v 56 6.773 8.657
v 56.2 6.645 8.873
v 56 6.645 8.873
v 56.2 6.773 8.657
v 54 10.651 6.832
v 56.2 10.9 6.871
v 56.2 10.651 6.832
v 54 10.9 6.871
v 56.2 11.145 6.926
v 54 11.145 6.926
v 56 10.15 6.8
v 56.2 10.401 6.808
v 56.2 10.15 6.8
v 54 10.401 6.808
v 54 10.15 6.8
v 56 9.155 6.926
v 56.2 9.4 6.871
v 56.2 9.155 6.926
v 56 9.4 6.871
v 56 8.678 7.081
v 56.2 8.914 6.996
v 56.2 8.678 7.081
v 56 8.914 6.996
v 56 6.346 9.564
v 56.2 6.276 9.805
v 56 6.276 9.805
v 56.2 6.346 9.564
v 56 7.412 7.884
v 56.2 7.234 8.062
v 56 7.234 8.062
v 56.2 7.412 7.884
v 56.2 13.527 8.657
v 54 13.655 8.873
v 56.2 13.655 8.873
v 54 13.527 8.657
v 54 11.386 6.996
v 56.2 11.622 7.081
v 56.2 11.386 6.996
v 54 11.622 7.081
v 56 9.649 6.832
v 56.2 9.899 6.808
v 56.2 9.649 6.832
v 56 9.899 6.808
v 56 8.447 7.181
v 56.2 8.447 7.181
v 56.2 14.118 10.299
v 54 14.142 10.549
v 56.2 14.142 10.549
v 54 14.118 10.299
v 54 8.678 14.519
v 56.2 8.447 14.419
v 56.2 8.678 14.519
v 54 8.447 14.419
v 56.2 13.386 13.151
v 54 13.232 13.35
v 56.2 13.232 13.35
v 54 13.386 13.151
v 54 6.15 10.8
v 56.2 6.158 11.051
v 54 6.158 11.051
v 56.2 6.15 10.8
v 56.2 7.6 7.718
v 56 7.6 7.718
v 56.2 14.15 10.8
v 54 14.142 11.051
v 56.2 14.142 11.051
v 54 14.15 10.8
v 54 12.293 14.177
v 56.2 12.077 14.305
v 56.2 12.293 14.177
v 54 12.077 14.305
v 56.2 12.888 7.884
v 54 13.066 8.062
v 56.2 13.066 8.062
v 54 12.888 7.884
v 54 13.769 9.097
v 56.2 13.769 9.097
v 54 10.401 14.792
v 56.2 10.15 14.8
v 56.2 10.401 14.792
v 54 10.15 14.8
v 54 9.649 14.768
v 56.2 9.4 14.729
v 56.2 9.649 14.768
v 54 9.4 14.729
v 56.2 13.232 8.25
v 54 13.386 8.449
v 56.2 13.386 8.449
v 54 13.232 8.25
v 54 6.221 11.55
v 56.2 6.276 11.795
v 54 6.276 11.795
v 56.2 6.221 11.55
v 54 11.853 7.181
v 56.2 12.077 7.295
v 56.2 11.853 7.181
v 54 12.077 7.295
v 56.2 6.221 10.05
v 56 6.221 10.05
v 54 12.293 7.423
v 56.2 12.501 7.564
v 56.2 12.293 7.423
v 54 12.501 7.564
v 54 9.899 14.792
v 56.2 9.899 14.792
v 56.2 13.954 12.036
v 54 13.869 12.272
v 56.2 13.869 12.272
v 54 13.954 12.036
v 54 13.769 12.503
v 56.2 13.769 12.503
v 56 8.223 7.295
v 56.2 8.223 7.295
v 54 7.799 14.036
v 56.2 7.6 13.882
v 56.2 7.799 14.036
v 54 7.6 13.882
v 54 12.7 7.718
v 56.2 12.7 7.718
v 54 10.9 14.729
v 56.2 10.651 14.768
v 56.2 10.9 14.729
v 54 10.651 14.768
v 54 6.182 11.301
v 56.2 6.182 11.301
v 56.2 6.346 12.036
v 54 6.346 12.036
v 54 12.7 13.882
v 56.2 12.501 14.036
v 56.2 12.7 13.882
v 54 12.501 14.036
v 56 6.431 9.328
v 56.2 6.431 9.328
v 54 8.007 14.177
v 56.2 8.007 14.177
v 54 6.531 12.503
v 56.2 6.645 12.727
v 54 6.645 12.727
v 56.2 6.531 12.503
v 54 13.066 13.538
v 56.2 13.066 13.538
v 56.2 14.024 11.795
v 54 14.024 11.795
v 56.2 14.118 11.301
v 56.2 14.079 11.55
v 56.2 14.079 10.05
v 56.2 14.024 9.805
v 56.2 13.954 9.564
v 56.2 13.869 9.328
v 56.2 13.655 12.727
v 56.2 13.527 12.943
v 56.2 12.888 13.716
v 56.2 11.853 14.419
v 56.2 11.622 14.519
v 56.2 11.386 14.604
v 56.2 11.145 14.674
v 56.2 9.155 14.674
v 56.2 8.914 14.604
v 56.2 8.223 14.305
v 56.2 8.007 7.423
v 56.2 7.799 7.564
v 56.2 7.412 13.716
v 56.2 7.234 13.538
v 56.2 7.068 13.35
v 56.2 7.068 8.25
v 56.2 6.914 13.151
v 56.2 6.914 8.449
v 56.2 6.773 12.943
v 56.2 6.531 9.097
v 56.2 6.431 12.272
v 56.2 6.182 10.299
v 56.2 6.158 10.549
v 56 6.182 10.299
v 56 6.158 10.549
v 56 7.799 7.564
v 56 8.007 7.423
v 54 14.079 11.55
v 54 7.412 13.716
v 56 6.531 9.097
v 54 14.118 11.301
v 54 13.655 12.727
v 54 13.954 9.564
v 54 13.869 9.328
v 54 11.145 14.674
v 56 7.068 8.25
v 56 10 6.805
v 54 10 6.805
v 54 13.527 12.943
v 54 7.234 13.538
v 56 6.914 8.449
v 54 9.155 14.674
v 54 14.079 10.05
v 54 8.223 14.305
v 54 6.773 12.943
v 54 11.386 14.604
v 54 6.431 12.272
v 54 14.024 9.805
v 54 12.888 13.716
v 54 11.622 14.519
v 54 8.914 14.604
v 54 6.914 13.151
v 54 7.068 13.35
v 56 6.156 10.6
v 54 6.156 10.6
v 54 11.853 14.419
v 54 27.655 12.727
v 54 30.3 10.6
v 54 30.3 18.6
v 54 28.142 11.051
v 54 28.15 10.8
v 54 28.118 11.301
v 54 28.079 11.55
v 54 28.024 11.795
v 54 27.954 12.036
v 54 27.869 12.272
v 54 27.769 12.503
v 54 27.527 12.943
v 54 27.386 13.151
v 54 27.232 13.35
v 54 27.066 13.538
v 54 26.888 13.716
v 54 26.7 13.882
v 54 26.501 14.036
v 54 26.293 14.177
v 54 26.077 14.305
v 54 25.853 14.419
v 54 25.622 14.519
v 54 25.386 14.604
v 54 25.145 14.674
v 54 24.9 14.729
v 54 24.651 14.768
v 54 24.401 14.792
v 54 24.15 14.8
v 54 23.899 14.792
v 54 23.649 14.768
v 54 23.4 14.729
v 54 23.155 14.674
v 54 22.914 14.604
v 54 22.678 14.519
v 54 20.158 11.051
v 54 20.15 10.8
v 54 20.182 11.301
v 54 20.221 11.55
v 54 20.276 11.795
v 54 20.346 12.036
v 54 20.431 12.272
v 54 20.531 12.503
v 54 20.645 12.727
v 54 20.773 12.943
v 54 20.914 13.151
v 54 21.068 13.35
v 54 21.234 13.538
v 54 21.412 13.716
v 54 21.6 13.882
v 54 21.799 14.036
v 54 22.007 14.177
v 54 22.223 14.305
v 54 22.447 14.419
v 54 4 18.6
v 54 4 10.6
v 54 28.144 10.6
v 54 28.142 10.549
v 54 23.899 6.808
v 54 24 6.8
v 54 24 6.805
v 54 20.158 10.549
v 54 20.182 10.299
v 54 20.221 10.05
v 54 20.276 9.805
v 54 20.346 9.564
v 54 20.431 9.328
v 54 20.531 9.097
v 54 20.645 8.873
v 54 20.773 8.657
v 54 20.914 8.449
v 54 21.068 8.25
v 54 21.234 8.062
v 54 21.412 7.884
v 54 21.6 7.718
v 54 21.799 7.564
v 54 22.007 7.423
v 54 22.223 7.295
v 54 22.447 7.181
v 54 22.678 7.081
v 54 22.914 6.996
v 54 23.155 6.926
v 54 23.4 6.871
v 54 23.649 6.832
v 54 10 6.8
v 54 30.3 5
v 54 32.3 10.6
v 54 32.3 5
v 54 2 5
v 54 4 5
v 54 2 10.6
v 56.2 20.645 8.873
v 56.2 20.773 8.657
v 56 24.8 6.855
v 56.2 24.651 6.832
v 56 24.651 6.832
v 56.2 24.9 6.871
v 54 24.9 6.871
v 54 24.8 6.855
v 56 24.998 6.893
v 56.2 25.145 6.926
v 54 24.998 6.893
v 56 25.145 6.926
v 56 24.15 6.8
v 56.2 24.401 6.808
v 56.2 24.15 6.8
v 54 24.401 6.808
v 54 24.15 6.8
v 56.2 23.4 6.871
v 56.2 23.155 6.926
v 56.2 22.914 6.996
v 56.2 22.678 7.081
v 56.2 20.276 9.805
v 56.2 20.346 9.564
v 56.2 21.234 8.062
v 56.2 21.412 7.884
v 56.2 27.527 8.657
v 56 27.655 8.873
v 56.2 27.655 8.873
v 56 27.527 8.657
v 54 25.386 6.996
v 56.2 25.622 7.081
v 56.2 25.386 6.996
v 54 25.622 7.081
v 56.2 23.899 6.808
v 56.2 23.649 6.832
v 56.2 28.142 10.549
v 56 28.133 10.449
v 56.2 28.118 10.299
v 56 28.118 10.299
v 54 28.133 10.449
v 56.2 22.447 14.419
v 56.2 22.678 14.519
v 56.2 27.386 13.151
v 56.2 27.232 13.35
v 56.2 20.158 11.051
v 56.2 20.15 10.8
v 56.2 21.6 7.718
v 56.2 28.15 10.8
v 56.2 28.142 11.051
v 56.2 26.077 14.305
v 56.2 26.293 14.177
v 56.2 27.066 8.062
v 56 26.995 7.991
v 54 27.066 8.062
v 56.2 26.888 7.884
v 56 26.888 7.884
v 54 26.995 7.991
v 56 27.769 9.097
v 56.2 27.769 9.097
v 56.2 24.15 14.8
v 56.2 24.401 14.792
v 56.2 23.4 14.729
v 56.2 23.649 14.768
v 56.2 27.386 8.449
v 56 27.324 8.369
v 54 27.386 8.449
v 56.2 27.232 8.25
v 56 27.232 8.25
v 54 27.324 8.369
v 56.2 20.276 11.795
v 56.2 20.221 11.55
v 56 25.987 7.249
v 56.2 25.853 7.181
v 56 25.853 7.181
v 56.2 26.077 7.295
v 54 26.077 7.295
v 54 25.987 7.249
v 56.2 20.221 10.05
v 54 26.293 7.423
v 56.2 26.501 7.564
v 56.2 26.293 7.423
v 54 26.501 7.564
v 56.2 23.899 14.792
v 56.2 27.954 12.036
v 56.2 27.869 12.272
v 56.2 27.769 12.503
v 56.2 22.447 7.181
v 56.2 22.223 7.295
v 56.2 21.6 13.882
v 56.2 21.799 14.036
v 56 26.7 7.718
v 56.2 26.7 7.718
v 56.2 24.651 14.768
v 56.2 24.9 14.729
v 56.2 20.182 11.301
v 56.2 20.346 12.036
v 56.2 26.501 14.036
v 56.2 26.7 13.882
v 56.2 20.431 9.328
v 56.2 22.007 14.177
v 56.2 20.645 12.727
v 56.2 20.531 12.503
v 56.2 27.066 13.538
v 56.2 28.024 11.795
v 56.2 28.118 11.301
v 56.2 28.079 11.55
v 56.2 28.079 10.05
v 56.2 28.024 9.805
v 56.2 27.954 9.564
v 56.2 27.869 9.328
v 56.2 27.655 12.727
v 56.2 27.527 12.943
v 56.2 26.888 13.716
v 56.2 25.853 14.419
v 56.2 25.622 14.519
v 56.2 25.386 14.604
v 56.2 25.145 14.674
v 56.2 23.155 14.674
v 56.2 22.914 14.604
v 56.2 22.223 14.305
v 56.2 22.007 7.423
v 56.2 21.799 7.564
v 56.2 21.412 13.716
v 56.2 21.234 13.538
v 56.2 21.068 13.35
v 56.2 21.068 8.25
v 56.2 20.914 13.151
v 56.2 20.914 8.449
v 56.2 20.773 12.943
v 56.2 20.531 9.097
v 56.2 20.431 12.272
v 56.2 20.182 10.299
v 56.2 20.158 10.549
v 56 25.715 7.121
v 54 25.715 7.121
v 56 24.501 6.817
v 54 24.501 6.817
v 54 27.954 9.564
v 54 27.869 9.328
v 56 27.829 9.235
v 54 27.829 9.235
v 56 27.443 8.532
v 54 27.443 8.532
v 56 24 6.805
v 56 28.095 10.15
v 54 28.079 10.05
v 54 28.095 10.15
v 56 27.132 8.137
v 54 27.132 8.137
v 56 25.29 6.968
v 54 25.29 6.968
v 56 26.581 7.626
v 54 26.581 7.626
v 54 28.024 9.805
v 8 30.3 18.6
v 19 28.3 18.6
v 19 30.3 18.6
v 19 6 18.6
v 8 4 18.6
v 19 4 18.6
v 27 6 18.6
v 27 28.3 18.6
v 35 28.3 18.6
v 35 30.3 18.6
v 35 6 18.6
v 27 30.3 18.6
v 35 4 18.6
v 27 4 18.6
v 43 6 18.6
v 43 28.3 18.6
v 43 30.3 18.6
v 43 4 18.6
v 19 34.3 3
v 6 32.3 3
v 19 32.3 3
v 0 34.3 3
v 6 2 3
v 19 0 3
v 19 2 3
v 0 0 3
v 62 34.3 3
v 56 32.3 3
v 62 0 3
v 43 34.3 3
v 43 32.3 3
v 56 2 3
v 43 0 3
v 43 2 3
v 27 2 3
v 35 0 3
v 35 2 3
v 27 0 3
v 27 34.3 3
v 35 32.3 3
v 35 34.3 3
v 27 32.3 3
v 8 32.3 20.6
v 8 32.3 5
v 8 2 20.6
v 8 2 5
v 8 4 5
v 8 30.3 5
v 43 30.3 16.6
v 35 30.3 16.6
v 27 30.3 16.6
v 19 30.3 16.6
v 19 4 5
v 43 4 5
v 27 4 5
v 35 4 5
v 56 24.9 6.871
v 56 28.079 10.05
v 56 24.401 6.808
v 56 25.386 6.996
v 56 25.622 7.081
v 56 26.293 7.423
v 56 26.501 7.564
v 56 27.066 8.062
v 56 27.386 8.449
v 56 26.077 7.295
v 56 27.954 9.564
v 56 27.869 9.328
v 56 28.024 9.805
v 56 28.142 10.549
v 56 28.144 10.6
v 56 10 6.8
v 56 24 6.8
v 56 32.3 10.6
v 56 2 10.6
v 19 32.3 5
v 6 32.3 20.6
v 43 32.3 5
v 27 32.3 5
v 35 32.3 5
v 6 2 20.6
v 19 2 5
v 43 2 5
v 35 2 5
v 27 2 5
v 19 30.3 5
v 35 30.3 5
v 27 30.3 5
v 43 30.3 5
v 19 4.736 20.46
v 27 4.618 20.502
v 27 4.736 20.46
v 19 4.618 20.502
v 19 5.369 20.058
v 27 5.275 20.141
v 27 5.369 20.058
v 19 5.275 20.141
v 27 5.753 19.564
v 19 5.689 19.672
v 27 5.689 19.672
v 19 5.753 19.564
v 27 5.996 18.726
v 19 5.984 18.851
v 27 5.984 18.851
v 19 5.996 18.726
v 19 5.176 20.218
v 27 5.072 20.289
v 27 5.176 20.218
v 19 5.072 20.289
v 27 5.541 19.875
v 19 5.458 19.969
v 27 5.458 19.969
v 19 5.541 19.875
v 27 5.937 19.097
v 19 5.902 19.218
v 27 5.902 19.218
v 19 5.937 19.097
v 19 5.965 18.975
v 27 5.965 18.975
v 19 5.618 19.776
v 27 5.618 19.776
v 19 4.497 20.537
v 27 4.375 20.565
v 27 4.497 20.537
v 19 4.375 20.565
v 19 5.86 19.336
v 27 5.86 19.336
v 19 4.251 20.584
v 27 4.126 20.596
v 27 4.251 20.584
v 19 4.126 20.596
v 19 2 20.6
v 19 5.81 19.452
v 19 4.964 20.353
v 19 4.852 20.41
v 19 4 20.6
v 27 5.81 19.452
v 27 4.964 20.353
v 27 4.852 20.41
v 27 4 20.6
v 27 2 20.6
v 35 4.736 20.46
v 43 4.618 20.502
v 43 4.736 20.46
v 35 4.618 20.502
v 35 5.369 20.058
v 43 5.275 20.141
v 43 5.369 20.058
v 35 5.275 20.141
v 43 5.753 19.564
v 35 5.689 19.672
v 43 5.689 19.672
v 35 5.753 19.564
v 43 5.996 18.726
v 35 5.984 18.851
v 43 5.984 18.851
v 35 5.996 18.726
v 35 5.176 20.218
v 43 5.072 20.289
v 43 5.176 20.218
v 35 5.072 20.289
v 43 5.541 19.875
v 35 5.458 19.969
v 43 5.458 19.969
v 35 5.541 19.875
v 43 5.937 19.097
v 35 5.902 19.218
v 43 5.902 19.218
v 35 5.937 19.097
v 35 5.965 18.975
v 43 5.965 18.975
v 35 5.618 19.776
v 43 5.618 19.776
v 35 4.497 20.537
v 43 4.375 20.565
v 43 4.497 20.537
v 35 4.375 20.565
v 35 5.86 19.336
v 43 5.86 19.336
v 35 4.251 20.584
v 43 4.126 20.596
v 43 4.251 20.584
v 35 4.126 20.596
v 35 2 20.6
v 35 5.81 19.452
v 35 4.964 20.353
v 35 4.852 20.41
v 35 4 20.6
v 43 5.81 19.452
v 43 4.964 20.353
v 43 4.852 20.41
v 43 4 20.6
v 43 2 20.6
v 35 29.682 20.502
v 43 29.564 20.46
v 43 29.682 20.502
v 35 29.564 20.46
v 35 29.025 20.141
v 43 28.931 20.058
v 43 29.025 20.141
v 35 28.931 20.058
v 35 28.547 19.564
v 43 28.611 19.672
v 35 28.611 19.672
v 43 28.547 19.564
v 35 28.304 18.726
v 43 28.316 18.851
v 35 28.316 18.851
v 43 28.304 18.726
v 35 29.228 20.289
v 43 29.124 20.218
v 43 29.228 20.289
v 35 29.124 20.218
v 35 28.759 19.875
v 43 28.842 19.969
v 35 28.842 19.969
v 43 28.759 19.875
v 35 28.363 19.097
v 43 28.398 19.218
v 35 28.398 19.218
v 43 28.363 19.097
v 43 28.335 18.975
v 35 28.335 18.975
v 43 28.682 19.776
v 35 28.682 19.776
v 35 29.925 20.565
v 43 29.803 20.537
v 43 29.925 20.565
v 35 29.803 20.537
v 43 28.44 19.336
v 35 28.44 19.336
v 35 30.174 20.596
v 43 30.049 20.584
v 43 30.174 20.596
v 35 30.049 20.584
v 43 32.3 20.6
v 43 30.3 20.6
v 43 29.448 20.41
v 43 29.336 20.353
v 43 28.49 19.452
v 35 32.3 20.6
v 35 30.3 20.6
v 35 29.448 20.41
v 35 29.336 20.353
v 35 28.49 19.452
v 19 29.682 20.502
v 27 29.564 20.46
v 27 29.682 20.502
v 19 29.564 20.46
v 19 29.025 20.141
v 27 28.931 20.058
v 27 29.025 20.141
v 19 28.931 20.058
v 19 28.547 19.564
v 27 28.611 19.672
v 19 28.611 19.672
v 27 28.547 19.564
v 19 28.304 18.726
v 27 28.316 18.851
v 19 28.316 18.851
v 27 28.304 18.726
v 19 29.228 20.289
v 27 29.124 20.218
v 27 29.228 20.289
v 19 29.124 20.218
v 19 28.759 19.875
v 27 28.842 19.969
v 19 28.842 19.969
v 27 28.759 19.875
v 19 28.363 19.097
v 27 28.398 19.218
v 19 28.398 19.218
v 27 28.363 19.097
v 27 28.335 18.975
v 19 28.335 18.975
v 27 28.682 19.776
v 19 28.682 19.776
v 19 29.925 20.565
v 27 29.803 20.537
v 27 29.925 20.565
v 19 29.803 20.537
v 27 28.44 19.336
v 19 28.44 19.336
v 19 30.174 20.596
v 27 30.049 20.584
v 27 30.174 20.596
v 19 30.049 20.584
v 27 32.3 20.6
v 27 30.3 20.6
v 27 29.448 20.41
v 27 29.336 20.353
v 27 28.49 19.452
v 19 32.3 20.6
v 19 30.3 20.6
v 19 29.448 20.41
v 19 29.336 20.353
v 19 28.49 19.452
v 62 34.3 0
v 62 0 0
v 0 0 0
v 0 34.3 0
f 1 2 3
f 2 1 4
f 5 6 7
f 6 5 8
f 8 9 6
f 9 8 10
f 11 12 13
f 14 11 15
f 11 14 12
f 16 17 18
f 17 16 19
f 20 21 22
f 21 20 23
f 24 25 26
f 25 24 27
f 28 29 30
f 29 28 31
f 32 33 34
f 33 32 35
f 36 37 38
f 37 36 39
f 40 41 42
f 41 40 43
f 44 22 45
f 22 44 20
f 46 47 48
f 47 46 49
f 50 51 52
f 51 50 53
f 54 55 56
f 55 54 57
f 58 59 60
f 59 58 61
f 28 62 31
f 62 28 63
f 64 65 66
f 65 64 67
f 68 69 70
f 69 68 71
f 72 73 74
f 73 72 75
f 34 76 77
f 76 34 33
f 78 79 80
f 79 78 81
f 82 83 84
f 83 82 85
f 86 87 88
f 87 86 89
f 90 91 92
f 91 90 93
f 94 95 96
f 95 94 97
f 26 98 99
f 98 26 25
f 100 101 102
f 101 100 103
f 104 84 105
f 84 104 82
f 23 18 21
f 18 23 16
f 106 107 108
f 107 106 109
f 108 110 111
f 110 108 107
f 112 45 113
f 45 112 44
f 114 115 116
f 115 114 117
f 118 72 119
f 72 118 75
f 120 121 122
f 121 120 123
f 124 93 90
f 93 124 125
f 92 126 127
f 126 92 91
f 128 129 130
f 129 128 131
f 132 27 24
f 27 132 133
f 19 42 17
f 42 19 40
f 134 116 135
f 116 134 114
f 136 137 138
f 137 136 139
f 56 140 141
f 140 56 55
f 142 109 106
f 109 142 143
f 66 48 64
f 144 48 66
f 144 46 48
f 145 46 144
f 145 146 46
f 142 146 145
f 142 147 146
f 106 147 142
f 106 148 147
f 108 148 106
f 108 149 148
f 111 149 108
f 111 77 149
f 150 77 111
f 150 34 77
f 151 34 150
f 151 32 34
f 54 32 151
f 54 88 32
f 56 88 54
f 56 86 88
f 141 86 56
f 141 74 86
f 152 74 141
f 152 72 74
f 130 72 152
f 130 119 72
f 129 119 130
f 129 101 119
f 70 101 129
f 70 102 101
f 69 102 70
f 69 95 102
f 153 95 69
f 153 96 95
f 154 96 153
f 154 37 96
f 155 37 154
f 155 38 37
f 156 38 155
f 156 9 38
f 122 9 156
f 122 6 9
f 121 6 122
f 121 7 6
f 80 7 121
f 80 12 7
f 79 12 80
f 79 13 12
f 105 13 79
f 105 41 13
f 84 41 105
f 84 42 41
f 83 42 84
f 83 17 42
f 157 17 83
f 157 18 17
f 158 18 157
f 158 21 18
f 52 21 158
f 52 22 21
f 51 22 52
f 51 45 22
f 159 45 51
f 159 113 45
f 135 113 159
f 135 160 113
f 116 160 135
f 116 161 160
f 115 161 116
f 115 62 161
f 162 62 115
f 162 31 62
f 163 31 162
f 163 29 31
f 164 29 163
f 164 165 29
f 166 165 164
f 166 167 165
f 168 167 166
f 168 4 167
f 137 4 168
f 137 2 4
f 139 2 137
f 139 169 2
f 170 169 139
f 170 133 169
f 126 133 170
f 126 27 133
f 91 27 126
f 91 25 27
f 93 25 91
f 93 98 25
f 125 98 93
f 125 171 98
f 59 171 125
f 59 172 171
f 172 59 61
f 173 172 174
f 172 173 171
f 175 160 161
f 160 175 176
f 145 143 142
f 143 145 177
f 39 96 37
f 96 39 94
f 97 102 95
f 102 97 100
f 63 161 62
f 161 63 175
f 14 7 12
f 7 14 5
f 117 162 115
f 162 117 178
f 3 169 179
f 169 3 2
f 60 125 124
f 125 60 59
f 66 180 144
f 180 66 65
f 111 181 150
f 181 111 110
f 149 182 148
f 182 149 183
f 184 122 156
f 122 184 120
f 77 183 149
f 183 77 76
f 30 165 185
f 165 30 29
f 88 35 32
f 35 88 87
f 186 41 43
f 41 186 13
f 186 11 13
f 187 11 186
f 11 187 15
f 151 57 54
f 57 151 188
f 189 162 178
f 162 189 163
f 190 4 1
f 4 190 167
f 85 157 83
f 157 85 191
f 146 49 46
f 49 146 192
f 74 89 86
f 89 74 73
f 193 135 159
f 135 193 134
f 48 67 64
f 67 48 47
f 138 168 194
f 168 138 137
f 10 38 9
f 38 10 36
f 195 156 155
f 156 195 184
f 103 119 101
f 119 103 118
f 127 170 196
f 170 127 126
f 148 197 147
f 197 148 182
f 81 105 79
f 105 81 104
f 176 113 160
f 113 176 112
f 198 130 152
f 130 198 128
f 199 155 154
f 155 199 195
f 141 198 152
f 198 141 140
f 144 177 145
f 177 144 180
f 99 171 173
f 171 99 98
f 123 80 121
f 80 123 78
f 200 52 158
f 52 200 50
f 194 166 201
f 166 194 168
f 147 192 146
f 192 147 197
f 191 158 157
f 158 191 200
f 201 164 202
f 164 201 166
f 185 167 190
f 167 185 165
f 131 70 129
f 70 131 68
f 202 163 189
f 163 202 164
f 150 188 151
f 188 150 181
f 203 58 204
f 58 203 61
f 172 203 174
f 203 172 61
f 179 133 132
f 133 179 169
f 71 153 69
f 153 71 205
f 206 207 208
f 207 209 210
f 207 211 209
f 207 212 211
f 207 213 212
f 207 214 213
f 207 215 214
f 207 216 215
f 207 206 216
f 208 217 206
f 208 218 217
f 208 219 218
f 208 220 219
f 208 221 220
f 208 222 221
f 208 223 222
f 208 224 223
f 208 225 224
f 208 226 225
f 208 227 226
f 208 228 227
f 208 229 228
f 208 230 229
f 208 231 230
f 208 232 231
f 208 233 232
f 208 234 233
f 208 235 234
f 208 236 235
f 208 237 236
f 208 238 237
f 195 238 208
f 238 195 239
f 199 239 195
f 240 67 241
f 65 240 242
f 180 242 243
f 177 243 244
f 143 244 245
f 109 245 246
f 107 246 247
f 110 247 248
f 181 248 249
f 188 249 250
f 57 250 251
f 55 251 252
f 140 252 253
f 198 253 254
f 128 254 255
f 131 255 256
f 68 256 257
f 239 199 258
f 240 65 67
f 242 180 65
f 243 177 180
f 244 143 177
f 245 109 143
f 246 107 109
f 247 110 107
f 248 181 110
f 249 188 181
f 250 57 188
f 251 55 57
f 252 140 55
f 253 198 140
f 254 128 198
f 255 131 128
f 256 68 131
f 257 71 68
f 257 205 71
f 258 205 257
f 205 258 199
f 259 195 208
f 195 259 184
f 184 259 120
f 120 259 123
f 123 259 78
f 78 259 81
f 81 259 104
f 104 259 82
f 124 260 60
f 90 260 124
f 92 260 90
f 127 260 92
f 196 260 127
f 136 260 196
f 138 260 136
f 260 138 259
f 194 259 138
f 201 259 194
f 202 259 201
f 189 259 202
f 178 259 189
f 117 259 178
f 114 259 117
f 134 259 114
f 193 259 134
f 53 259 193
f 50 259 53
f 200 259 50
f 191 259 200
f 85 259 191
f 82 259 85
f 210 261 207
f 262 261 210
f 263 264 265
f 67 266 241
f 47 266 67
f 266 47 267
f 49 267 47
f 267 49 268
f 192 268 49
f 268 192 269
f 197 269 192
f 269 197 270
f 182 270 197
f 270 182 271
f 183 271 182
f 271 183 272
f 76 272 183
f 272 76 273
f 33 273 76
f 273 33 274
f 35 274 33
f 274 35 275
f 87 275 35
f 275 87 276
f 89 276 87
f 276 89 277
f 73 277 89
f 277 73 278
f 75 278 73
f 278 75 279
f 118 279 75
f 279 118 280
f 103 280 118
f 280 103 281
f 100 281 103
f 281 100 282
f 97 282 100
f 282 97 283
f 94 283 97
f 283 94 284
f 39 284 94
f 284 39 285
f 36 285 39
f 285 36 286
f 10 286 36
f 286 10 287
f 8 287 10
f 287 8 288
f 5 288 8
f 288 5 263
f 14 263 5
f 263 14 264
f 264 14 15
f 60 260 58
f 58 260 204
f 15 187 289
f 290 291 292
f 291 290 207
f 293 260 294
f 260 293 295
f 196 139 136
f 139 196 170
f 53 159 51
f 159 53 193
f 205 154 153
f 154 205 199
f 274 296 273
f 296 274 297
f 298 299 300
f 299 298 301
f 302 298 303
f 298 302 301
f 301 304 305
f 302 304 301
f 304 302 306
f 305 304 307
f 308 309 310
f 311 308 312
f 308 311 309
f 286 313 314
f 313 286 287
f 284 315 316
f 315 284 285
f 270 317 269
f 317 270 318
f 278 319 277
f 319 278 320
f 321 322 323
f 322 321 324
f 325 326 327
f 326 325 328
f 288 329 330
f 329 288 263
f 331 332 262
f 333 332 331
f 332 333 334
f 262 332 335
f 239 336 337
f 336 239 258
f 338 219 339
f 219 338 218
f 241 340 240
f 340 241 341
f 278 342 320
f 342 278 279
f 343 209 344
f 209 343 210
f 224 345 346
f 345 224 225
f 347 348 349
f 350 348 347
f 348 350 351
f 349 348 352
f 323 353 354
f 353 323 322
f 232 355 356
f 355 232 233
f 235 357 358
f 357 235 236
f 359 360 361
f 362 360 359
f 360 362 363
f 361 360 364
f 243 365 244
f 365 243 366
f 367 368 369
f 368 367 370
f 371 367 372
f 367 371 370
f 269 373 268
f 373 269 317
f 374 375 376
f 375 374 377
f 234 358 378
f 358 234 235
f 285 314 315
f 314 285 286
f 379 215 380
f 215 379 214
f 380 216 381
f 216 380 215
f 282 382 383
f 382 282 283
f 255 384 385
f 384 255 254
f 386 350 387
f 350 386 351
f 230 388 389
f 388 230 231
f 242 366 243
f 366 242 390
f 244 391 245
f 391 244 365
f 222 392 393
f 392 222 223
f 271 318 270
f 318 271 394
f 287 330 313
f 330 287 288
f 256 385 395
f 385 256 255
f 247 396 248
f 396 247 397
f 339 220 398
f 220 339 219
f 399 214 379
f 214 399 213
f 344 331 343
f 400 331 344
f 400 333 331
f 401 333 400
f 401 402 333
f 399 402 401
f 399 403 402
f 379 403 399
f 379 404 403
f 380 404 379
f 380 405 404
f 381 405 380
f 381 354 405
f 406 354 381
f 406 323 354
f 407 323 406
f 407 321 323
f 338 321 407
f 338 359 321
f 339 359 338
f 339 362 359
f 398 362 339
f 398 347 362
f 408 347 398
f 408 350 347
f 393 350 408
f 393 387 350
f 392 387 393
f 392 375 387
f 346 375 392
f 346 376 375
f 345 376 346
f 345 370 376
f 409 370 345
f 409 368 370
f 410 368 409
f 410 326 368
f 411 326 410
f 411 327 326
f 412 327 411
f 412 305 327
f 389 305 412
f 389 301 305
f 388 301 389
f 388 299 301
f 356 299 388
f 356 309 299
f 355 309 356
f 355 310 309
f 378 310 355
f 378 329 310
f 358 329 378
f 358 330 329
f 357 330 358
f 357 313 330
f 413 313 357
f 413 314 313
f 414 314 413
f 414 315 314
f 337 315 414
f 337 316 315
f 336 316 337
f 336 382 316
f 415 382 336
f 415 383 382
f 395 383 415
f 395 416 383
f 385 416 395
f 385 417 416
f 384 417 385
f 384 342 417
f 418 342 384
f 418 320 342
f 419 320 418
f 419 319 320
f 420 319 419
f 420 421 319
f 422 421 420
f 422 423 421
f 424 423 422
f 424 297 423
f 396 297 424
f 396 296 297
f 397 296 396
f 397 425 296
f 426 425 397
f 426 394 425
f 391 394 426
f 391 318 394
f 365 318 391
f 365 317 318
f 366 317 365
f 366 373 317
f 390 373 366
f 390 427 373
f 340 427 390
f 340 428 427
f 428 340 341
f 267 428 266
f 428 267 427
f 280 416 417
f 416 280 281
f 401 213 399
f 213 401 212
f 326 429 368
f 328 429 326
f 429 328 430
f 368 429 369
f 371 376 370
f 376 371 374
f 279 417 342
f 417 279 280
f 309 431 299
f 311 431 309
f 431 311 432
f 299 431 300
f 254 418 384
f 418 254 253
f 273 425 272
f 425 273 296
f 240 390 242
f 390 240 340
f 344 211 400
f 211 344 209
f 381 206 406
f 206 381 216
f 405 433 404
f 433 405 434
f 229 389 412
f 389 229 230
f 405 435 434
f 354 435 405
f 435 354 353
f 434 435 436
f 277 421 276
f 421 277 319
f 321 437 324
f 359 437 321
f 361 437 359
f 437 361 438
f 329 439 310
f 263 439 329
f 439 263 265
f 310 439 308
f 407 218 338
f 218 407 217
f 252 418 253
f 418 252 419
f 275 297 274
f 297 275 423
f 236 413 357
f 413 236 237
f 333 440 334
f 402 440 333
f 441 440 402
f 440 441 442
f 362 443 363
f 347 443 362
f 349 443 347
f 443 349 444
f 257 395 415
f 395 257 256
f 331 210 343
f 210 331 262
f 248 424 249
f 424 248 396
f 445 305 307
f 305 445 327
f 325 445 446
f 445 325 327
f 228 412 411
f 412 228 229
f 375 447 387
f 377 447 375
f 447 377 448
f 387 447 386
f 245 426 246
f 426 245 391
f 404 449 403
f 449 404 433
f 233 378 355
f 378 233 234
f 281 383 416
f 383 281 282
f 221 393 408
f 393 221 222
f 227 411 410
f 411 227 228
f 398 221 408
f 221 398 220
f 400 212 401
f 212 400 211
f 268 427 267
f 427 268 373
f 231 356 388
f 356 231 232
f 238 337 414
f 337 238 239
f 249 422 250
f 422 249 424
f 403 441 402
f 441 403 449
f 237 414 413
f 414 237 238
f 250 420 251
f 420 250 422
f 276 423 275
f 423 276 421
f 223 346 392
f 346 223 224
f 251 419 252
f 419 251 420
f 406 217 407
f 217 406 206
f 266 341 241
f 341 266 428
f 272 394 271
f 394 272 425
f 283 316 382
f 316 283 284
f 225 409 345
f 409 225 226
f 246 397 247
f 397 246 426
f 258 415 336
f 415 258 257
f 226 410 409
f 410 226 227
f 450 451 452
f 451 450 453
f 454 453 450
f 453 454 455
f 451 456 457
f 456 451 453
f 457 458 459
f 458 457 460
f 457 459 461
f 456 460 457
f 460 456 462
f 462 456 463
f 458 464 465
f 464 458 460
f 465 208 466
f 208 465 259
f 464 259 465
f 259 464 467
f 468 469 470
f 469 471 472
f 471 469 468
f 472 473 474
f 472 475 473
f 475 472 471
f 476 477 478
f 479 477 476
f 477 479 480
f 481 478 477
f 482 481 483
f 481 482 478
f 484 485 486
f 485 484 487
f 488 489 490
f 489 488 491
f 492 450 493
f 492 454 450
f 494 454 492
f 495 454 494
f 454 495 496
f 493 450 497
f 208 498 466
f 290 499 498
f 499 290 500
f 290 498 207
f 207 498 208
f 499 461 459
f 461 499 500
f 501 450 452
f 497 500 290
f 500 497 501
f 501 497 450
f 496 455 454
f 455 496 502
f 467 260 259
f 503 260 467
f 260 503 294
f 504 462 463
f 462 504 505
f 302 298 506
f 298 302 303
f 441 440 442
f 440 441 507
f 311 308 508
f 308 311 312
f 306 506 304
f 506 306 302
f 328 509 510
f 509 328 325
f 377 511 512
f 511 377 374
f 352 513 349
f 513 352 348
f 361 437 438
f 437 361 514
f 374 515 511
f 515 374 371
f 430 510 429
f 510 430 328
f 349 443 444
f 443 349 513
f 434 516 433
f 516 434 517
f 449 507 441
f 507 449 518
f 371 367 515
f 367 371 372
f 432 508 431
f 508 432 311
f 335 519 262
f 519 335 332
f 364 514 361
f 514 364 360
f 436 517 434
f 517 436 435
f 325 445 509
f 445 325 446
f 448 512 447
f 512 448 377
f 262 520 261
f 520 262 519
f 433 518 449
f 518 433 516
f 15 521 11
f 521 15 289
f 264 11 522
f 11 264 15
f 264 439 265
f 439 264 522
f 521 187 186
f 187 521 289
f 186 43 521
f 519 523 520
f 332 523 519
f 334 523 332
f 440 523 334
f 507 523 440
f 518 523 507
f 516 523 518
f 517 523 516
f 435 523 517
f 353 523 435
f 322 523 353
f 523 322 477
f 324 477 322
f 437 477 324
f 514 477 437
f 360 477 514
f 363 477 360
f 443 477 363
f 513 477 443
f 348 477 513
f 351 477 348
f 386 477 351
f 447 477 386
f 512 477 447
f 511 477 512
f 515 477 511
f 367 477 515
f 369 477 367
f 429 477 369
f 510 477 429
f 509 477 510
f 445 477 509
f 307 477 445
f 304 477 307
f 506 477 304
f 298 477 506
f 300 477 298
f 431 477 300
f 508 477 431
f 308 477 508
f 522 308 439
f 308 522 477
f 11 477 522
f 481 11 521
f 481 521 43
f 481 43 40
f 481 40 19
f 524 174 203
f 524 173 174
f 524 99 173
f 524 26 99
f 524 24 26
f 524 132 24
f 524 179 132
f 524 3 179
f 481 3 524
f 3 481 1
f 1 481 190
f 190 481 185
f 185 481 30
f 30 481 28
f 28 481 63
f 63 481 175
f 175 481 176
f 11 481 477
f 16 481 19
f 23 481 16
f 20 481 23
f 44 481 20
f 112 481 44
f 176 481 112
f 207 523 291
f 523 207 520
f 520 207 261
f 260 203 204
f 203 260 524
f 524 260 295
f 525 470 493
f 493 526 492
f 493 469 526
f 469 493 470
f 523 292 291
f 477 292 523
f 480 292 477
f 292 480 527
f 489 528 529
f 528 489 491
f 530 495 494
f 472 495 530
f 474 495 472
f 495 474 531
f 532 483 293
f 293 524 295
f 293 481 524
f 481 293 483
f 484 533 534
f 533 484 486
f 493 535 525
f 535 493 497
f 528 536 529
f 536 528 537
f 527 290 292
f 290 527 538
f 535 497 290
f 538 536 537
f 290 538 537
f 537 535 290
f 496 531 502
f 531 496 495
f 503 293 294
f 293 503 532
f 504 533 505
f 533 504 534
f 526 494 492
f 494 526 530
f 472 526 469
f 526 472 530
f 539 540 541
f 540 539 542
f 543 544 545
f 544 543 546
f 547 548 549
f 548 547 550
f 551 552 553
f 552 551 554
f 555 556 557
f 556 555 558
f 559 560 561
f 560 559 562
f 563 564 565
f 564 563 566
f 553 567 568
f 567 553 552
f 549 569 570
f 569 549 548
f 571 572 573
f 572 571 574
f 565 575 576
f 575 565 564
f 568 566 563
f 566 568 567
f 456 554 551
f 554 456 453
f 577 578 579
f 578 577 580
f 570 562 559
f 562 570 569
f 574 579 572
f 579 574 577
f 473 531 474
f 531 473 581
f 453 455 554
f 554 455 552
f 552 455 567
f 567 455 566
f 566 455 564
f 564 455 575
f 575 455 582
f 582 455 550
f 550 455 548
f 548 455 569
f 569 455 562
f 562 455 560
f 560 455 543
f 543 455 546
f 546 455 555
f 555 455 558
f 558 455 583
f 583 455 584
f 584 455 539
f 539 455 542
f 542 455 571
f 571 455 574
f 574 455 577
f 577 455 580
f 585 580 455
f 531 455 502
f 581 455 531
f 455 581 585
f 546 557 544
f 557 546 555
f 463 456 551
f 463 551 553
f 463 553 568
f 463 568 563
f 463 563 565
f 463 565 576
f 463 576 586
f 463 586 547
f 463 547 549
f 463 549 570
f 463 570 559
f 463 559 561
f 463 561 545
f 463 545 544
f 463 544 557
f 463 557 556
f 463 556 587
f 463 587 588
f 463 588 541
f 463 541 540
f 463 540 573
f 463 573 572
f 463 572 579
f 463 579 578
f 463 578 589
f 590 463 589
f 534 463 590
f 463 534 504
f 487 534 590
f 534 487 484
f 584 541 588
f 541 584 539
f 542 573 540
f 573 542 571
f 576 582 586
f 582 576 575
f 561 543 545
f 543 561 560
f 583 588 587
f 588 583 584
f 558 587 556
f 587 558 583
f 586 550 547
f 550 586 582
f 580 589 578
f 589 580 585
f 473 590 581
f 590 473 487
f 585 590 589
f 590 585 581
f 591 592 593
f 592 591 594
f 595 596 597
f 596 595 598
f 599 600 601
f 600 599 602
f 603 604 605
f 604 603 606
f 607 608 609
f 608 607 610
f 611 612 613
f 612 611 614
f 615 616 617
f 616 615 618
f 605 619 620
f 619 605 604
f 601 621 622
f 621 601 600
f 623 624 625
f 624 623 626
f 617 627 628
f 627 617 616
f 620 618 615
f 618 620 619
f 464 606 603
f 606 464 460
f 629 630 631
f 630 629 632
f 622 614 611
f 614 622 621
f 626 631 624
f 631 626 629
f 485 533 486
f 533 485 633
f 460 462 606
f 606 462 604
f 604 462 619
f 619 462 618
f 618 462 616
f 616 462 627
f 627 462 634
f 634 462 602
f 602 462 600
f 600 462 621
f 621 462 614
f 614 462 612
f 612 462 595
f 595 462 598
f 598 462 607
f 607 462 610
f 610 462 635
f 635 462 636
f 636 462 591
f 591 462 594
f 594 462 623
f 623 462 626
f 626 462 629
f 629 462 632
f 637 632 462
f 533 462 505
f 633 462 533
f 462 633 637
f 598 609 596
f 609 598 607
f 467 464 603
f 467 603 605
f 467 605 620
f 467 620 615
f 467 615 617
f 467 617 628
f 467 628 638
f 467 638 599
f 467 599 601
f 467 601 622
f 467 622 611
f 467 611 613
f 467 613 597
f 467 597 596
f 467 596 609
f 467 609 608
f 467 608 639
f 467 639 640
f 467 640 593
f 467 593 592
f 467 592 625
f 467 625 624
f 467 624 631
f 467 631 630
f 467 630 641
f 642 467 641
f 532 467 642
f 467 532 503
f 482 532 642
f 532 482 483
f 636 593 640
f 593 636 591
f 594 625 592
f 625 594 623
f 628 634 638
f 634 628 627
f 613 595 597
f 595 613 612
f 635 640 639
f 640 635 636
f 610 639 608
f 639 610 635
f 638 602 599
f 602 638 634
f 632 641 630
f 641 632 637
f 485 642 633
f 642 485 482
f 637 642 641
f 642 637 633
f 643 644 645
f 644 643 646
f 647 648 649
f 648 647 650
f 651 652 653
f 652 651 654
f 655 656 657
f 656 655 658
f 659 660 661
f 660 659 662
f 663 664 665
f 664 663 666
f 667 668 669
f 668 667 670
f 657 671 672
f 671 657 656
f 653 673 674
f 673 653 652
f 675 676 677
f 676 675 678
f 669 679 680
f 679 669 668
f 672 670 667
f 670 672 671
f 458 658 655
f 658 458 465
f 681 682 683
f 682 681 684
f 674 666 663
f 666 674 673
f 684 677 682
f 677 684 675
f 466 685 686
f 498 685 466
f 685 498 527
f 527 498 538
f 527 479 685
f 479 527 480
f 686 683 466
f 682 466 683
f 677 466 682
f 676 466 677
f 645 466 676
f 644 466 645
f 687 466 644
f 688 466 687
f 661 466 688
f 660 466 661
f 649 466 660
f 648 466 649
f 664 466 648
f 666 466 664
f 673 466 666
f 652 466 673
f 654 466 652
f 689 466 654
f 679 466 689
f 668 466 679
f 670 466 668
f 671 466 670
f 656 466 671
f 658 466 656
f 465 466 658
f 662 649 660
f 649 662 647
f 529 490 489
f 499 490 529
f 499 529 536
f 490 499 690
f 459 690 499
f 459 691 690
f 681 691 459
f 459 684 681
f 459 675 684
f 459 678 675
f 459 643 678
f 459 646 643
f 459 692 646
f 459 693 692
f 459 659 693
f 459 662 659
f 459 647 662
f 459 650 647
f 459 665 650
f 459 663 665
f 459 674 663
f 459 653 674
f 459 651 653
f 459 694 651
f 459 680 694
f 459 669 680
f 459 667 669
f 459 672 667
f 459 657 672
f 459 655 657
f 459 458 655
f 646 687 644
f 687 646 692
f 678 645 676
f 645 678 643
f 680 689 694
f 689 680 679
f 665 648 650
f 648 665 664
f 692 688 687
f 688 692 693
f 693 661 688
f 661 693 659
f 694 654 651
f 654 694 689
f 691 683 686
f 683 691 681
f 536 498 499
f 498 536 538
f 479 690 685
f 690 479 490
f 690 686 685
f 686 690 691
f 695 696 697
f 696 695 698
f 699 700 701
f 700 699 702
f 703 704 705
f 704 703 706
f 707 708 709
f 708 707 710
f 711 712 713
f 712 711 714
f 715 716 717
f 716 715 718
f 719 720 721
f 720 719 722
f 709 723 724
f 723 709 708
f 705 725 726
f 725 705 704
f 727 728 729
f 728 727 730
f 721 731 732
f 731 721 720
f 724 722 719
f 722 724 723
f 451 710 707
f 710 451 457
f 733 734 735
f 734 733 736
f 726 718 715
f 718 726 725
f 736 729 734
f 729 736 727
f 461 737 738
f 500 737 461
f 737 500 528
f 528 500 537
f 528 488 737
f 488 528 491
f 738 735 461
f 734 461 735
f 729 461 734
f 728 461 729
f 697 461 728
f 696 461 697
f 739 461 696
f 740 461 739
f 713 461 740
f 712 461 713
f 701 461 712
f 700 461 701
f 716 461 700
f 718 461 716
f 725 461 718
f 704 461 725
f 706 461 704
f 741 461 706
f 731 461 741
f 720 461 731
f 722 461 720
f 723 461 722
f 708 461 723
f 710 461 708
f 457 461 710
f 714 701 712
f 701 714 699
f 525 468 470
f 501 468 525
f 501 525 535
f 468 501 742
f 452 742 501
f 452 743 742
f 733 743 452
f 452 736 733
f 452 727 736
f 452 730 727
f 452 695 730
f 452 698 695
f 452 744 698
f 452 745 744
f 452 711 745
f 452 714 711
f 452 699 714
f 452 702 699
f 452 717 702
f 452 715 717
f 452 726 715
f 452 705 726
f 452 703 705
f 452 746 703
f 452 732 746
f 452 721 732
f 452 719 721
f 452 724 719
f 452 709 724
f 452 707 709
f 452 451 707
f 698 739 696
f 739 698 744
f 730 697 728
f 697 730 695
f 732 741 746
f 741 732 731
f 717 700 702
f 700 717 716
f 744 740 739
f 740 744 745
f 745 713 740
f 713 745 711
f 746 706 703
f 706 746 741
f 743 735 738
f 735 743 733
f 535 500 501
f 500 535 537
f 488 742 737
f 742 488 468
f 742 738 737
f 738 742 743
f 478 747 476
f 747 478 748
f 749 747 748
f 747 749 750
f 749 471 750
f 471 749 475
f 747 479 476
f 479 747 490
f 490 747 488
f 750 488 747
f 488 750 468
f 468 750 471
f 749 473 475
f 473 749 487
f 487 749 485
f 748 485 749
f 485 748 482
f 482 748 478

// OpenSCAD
// sof
// ------------------------------------------------------------------
//
// Autor: Ivo Panáček, January 2021
// ivo.panacek@gmail.com
// Version: 0
//
// ------------------------------------------------------------------
// parameters

batteryHeight = 46;

batteryWidth = 26.3;
batteryThickness = 15.6;

batteryTopDelta = -8;

batteryPinRadius = 4;
batteryPinDistance = 14;
batteryPinHeight = 2.2;

clipStartDelta = -2;
clipWidth = 8;
clipBase = 4;
clipTop = 2;
clipRadius = 2;
clipDistance = 8;

wallThickness = 2;
rimHeight = 2;

bottomThickness = 3;
bottomPaddingX = 6;
bottomPaddingY = 2;

dreh=$t*360;
$fn=100;

// ------------------------------------------------------------------
// main program

realBatteryInSpace();

fullHolder();

// ------------------------------------------------------------------
// modules

module fullHolder() {
    bottom();
    translate([bottomPaddingX,bottomPaddingY,bottomThickness])
    union() {
        batteryBase();
        batteryClips();
    }
}


module batteryClips() {
    size = 2*clipWidth+clipDistance;
    margin = (batteryHeight-size)/2;
    color([0,1,1])
    translate([margin+wallThickness,wallThickness,0])
    union() {
        batterySideClips();
        translate([size,batteryWidth,0])
        rotate([0,0,180])
        batterySideClips();
    }
}

module batterySideClips() {
    union() {
        batteryClip();
        translate([clipWidth+clipDistance,0,0])
        batteryClip();
    }
}

module batteryClip() {
    d = 2*clipRadius;
    h = batteryThickness + d + clipStartDelta;
    x = clipWidth;
    y = clipTop;
    z = h;
    y0 = clipTop-clipBase;

    points = [
        [ 0, y0, 0], // 0
        [ x, y0, 0], // 1
        [ x, y, 0], // 2
        [ 0, y, 0], // 3
        [ 0, 0, z], // 4
        [ x, 0, z], // 5
        [ x, y, z], // 6
        [ 0, y, z] // 7
    ];

    faces = [
        [0,1,2,3],  // bottom
        [4,5,1,0],  // front
        [7,6,5,4],  // top
        [5,6,2,1],  // right
        [6,7,3,2],  // back
        [7,4,0,3] // left
    ];

    //translate([0,-clipTop,0])
    union() {
        // cube([x,y,z]);
        translate([0,-clipTop,0])
        polyhedron( points, faces );

        translate([0,0,h-clipRadius])
        difference() {
            rotate([0,90,0])
            cylinder(r=clipRadius,h=clipWidth);
            translate([-clipWidth,-d,-d])
            cube([3*clipWidth,d,2*d]);
        }
    }
}

module batteryBase() {
    union() {
        batteryBottom();
        batteryTop();
        batteryRim();
    }
}

module batteryRim() {
    color([0,0,1])
    translate([wallThickness,0,0])
    difference() {
        cube([batteryHeight,batteryWidth+2*wallThickness,rimHeight]);
        translate([-rimHeight,wallThickness,-rimHeight])
        cube([batteryHeight+2*rimHeight, batteryWidth, 3*rimHeight]);
    }
}

module batteryPins() {
    d = 2*batteryPinRadius;
    left = batteryWidth-batteryPinDistance-d;
    margin = left / 2;
    color([1,0,1])
    translate([-wallThickness,wallThickness,batteryThickness/2])
    union() {
        translate([0, margin+batteryPinRadius, 0])
        batteryPin();
        translate([0, margin+batteryPinRadius+batteryPinDistance, 0])
        batteryPin();        
        batteryPinBridge();
    }
}

module batteryPinBridge() {
    union() {
        translate([ 0, batteryPinRadius+wallThickness, -batteryPinRadius])
        cube([3*wallThickness, batteryPinDistance, batteryThickness]);
    }
}

module batteryPin() {
    x = 3*wallThickness;
    union() {
        rotate([0,90,0])
        cylinder(r = batteryPinRadius, h = x);
        translate([0,-batteryPinRadius,0])
        cube([x, 2*batteryPinRadius, batteryThickness]);
    }
}

module batteryTop() {
    color([1,1,0])
    translate([wallThickness+batteryHeight, 0, 0])
    difference() {
        cube([wallThickness, batteryWidth + 2*wallThickness, batteryThickness+batteryTopDelta]);
        batteryPins();
    }
}

module batteryBottom() {
    color([1,1,0])
    cube([wallThickness, batteryWidth + 2*wallThickness, batteryThickness+2*clipRadius+clipStartDelta]);
}

module bottom(){
  x = 2*bottomPaddingX + batteryHeight + 2*wallThickness;
  y = 2*bottomPaddingY + batteryWidth + 2*wallThickness;
  z = bottomThickness;
  color([1,0,0]) cube([x,y,z]);
}

// ---------------------------------------
// just to see battery

module realBatteryInSpace() {
    translate([wallThickness+bottomPaddingX,wallThickness+bottomPaddingY,bottomThickness])
    realBattery();
}

module realBattery() {
    color([0,1,0])
    union() {
        cube([batteryHeight, batteryWidth, batteryThickness]);
        translate([batteryHeight,0,0])
        realBatteryPins();
    }
}

module realBatteryPins() {
    d = 2*batteryPinRadius;
    left = batteryWidth-batteryPinDistance-d;
    margin = left / 2;
    translate([0,0,batteryThickness/2])
    union() {
        translate([0, margin+batteryPinRadius, 0])
        realBatteryPin();
        translate([0, margin+batteryPinRadius+batteryPinDistance, 0])
        realBatteryPin();
    }
}

module realBatteryPin() {
    rotate([0,90,0])
    cylinder(r = batteryPinRadius, h = batteryPinHeight);
}



// ------------------------------------------------------------------
// eof
